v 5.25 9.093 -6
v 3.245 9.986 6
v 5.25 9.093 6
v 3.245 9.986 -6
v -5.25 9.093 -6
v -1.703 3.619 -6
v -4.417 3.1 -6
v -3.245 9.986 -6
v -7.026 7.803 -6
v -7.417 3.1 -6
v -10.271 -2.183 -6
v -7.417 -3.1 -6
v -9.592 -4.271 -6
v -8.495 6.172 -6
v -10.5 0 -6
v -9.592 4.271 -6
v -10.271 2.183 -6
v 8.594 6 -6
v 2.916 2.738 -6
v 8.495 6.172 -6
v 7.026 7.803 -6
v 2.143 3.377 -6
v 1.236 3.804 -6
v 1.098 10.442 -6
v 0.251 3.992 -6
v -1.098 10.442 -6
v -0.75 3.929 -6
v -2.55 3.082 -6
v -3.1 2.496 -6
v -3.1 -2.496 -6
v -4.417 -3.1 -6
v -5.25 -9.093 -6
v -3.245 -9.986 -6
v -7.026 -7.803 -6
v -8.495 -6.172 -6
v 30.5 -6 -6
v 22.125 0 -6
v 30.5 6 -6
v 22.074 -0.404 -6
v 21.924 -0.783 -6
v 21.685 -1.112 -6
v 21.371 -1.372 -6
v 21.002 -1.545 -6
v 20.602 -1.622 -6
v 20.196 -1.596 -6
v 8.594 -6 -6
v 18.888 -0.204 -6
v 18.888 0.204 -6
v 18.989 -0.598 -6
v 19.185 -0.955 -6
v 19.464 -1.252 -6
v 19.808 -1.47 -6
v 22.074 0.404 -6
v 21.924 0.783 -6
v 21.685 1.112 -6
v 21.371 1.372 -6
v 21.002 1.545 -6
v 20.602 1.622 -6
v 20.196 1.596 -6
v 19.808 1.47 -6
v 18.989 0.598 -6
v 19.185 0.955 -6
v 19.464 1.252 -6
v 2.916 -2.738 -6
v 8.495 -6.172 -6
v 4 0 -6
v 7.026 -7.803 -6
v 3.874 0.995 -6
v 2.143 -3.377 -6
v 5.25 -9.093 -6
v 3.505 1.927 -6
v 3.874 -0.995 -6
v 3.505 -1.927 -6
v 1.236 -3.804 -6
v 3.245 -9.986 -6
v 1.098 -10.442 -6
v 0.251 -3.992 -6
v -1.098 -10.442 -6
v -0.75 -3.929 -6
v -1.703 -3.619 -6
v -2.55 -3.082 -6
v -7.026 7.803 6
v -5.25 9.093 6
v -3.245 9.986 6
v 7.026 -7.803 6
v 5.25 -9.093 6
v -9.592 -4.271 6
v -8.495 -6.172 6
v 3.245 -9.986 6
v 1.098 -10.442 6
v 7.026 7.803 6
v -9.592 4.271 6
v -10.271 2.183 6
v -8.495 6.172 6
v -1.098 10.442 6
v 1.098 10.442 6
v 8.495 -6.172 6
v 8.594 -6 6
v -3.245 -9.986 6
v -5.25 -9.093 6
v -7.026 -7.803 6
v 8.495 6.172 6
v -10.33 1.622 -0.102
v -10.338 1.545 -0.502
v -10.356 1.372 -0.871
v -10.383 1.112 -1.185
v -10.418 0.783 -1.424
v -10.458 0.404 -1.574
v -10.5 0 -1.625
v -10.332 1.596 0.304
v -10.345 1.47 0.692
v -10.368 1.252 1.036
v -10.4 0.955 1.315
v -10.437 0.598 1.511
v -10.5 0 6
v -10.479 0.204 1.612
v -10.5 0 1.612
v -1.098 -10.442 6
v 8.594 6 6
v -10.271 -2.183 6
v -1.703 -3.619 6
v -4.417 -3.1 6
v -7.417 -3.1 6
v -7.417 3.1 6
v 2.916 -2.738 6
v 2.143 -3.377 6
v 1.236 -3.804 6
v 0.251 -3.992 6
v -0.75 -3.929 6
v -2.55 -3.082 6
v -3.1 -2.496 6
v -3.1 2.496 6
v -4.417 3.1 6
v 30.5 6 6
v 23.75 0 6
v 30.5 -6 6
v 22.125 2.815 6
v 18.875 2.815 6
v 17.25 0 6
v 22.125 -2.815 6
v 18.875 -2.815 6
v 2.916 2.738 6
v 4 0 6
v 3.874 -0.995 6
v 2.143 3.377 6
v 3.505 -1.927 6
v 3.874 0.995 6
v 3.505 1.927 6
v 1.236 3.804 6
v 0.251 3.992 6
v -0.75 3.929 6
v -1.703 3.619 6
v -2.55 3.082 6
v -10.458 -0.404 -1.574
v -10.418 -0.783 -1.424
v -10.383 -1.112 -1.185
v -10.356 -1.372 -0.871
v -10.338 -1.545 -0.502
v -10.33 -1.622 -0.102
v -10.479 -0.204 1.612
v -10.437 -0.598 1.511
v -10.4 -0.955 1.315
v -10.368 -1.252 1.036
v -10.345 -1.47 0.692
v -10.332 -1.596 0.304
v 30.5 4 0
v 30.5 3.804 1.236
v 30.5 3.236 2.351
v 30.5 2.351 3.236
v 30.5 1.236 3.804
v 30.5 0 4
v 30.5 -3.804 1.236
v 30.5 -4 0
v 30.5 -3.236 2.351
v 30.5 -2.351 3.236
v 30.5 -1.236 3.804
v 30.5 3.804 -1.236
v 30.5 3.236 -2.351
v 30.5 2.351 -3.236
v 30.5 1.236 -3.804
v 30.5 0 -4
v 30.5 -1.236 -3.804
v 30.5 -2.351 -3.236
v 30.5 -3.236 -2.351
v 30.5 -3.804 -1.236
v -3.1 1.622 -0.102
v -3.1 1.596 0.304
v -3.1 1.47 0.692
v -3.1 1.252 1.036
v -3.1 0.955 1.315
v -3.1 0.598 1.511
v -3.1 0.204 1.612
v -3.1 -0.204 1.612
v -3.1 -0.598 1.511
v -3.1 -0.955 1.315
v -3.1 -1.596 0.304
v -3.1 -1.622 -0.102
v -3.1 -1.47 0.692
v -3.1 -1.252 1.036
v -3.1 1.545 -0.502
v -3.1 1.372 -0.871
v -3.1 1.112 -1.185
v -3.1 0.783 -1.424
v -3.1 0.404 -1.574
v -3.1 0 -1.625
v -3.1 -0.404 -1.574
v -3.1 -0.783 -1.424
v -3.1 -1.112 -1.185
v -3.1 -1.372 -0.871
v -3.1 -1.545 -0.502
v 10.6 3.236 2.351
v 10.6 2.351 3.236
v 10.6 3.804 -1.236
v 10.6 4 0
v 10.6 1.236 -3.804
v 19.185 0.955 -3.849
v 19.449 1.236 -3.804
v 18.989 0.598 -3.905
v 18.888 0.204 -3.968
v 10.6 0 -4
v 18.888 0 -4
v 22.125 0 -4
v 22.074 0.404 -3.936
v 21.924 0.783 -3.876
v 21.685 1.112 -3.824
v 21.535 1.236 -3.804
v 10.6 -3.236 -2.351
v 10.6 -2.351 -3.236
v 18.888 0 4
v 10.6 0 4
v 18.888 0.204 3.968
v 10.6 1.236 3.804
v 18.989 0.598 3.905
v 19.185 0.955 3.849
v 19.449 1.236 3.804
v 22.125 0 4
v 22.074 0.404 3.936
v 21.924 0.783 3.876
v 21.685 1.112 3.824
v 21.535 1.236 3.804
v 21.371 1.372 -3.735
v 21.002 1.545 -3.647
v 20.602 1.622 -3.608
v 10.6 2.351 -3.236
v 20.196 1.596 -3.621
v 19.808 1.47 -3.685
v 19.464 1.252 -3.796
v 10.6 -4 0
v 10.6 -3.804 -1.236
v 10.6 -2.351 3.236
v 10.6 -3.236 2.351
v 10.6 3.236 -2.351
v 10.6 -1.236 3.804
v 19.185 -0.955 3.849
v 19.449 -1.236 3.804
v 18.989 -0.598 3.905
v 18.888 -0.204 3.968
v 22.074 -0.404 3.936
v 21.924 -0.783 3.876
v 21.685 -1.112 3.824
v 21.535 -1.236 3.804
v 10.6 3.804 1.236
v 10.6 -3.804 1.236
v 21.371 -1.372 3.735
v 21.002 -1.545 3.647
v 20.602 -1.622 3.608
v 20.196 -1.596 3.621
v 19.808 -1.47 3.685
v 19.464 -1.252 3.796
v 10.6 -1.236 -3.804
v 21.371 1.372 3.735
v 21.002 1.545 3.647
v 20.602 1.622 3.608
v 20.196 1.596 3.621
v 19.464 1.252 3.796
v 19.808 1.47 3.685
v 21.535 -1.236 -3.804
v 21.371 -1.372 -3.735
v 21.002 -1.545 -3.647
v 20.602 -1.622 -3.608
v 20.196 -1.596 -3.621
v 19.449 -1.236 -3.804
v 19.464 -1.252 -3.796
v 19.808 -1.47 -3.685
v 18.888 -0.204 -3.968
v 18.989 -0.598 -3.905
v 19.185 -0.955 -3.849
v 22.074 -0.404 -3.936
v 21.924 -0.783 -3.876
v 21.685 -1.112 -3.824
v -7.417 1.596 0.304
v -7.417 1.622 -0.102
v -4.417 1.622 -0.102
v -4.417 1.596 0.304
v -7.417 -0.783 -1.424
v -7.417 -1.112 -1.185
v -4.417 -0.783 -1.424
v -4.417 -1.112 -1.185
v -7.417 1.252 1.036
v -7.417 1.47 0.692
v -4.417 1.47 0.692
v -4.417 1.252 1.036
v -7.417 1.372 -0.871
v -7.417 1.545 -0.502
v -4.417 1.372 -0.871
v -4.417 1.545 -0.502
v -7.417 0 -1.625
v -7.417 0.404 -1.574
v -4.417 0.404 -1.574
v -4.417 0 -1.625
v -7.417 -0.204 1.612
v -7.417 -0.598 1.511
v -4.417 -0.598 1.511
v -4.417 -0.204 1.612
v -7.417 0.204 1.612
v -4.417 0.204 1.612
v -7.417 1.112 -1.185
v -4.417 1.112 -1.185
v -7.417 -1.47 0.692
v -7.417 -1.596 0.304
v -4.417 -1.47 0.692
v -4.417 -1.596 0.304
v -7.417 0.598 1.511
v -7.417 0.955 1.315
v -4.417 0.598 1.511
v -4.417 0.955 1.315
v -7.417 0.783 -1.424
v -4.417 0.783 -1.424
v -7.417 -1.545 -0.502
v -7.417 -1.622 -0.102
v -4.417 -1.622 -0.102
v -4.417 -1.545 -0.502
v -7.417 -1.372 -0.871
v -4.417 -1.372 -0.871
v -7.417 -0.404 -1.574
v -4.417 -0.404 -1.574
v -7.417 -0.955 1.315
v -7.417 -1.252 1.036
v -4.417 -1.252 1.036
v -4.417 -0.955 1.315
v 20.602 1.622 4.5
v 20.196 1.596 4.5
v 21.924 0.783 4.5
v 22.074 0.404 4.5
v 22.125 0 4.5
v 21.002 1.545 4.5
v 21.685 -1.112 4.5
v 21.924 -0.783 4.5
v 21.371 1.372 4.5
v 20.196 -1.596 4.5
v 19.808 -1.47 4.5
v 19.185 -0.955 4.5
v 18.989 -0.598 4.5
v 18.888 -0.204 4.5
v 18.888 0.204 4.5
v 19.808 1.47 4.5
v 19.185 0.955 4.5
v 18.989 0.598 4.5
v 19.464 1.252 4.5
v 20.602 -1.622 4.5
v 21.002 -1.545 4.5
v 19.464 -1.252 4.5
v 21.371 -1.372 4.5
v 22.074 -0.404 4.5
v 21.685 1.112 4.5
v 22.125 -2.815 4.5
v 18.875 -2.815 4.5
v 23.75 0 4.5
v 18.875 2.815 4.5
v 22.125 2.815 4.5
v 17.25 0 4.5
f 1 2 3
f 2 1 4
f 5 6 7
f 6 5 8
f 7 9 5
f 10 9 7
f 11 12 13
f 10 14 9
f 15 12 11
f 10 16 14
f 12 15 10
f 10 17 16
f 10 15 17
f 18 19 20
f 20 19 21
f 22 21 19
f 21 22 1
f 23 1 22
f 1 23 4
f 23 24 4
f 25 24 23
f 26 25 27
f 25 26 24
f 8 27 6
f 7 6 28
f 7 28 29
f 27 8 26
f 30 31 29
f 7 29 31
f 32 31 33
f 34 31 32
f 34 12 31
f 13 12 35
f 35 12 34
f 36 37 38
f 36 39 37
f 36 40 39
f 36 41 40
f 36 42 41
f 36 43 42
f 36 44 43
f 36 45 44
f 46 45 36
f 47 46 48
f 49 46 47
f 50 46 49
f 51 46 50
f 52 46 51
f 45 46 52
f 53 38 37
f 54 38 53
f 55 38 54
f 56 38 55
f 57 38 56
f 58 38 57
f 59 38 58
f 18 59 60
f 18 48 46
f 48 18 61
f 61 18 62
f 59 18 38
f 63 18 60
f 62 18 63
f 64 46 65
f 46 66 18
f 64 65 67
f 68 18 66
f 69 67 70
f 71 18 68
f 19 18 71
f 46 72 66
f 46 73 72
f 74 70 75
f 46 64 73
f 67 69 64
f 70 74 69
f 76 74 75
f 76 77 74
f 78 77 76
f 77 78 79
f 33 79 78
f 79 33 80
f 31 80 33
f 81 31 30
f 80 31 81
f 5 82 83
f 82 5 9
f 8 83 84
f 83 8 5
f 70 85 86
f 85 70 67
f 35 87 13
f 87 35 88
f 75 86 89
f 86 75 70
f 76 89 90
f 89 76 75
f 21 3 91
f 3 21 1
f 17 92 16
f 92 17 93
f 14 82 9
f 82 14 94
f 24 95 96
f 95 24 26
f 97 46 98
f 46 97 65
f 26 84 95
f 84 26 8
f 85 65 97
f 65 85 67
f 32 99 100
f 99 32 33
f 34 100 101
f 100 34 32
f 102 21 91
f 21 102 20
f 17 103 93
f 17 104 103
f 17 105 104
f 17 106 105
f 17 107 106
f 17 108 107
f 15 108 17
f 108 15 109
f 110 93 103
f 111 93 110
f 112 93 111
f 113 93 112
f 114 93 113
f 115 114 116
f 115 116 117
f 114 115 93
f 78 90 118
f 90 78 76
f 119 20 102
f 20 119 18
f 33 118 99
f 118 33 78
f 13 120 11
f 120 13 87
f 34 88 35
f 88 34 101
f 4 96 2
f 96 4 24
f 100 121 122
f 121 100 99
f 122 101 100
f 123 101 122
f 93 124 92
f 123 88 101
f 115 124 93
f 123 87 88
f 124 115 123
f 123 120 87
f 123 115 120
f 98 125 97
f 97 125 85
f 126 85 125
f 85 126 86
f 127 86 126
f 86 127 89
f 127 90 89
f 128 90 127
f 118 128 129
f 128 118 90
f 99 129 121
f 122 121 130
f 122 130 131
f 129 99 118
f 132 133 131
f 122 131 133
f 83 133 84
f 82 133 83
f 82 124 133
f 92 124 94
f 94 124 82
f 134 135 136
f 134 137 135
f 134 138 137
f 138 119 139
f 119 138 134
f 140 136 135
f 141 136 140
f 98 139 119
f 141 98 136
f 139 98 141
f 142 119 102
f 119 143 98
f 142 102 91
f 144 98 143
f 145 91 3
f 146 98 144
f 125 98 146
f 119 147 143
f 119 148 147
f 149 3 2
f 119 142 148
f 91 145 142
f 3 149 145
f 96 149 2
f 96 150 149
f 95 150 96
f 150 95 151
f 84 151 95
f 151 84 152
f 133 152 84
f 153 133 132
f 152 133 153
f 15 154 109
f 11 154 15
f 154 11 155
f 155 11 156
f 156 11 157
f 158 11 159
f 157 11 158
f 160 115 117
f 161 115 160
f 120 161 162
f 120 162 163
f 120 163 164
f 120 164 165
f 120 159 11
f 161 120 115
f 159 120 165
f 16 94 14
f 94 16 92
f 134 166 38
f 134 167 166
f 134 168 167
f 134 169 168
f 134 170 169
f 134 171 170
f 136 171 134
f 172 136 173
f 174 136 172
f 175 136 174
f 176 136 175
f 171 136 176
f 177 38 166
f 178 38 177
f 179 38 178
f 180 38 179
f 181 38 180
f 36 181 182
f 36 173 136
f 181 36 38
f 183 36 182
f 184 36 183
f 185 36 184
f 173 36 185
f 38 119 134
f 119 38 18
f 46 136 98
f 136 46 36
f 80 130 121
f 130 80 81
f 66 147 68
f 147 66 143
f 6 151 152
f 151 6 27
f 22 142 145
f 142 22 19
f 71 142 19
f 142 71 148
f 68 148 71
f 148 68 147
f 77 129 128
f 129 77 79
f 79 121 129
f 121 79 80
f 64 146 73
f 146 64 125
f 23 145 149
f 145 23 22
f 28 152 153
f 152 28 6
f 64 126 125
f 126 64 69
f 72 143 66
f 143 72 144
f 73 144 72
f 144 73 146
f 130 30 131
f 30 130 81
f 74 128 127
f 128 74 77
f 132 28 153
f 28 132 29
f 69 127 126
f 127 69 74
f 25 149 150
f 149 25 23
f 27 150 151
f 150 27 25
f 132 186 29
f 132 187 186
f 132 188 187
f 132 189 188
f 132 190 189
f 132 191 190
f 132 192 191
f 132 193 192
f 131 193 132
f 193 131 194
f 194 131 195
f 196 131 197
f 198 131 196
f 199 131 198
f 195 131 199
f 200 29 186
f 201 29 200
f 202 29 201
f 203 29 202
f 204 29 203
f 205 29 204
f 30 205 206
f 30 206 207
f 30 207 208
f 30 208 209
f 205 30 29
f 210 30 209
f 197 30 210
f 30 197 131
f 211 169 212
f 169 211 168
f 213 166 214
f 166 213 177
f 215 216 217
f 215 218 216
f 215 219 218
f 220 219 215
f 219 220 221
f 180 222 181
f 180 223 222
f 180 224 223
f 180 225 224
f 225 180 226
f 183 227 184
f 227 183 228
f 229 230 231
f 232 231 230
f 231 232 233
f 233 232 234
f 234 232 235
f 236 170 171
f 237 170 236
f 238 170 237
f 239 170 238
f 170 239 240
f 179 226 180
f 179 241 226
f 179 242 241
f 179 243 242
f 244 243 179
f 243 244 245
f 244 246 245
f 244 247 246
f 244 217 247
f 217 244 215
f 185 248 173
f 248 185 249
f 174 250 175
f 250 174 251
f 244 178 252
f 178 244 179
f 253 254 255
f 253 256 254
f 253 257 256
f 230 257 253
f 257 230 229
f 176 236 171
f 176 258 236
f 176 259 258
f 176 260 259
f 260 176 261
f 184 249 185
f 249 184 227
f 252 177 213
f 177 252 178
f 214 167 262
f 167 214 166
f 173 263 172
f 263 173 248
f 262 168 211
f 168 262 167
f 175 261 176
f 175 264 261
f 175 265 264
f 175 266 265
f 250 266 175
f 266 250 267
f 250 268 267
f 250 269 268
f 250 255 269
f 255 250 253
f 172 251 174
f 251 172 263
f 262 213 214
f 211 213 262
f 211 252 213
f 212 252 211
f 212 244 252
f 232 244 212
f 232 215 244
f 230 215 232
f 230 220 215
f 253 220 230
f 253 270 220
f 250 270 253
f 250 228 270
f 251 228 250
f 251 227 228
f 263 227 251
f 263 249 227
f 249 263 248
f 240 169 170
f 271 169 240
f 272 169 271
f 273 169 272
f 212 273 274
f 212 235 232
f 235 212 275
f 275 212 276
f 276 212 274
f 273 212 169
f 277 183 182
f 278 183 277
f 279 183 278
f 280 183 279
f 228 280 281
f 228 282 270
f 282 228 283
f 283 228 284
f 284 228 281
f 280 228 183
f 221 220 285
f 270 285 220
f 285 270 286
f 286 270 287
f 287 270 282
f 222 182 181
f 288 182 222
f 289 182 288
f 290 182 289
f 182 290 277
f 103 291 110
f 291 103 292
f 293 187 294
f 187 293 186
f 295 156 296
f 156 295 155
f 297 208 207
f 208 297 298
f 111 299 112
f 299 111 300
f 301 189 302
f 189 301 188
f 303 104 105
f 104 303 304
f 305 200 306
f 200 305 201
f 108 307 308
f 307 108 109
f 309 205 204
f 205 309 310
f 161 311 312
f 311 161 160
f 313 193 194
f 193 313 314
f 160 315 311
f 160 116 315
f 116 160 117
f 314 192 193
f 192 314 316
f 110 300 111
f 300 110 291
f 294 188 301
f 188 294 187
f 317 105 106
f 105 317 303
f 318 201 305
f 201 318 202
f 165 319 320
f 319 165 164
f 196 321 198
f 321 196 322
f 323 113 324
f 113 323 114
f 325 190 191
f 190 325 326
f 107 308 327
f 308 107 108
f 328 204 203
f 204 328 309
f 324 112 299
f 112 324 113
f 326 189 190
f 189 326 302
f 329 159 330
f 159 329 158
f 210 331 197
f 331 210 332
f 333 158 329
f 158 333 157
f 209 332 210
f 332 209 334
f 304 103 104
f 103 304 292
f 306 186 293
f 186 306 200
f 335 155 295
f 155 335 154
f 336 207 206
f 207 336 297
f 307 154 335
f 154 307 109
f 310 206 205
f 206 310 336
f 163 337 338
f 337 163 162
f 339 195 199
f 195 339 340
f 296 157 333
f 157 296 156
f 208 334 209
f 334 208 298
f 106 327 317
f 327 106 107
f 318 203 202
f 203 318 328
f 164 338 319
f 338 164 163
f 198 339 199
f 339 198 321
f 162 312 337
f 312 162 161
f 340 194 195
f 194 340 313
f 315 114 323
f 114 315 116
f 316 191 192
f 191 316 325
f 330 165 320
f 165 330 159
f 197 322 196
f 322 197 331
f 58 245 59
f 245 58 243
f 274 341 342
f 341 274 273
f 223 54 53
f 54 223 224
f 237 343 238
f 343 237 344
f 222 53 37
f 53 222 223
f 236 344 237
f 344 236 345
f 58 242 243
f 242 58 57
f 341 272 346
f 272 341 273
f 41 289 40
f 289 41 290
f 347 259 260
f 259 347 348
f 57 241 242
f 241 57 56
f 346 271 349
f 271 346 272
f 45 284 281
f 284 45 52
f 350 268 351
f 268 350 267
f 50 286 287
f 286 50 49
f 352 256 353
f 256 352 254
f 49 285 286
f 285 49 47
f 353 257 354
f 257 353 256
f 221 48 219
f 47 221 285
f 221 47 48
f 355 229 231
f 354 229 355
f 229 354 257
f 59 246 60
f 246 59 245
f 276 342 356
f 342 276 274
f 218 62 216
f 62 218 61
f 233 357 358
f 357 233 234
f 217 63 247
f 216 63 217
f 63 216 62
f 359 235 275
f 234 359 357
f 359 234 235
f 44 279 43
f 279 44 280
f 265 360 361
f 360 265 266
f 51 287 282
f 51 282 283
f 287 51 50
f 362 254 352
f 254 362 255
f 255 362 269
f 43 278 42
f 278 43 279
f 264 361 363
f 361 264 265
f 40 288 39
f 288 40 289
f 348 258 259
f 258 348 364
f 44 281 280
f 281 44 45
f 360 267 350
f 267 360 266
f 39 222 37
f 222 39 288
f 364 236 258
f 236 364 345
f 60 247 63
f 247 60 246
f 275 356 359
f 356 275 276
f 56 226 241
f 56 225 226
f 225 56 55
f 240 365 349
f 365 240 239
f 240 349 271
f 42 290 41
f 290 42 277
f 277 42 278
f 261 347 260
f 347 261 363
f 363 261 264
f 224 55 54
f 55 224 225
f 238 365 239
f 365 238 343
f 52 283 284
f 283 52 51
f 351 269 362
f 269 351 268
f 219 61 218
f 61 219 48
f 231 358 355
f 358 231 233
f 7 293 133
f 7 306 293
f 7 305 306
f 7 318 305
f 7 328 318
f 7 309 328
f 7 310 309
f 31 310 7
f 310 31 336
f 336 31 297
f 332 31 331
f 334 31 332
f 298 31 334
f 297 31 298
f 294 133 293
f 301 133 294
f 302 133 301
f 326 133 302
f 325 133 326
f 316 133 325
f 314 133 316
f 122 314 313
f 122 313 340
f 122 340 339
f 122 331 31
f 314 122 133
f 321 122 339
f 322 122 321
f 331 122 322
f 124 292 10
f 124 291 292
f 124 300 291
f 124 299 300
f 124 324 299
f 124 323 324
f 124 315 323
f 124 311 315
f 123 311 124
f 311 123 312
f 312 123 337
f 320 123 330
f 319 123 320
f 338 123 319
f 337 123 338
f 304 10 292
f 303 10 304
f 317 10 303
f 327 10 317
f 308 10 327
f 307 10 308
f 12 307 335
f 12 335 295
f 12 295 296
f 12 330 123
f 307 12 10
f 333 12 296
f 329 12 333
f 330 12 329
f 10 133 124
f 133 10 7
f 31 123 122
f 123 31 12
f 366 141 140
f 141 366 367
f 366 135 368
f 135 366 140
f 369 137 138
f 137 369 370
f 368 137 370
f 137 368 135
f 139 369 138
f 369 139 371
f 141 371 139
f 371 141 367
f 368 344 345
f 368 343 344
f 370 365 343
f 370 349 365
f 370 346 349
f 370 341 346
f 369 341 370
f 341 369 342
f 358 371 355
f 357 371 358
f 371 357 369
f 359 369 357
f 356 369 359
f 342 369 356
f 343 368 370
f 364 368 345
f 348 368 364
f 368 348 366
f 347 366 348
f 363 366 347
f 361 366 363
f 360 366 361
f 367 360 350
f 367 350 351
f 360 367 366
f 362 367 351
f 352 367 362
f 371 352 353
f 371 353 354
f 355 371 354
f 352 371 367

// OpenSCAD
// file: variables.scad
// Pinya3 3D Food Printer
// file: variables.scad 
// author: Luis Rodriguez
// version: 0.1
// w3b: 3digitalcooks.com 

// Variables for all the project
// just numbers??
alpha = 0.7;

// FRAME 
frame_alpha = alpha;
frame_profile_width = 20;

frame_height = 370;
frame_width = 250;  // 250mm -> 7capsules~de 8cm
frame_lenght = 200;

// PRINTING AREA
// from: https://www.marginallyclever.com/other/samples/fk-ik-test.html
// Base radius (f) = 80mm
// End Effector radius (e) = 30mm
// Bice length (rf) = 200mm
// Forearm length = 260mm
// PA = 260 x 260 x 260
// X=-128.225 to 128.225 mm 
// Y=-128.225 to 128.225 mm
// Z=-387.23 to -130.781 mm
printing_area_alpha = 0.2;
printing_area_x = 128*2;//195*2;
printing_area_y = 128*2;//195*2;
printing_area_distance_from_motors_base = 130;//151
printing_area_z_max = 387;
printing_area_z = printing_area_z_max - printing_area_distance_from_motors_base;//540-151;
echo("printing z =",printing_area_z);
printing_area_x_displacement = frame_width/2 + printing_area_x/2;

// FOREARM 
forearm_alpha = alpha;
forearm_length = 200;
forearm_rad = 4;
forearm_motors_joint_rad = 25;

// MOTORS BASE
motors_base_alpha = alpha;
motors_base_thickness = 6;
motors_base_rad = forearm_motors_joint_rad;

// DELTA BEAM
delta_beam_alpha = alpha;
delta_beam_length = printing_area_x_displacement 
                    + forearm_motors_joint_rad 
                    + frame_width/2;
echo("Delta beam lenght = ", delta_beam_length);
delta_beam_profile_width = frame_profile_width*3; //60cm
delta_beam_under_frame = 0; // 1 = Beam under frame or 0 = Beam on frame
delta_beam_bolt_rad = 4;
delta_beam_distance_btw_slots = 20;


// CAROUSEL
carousel_alpha = 0.3;
carousel_number_of_tools = 11;
carousel_offset_rotation = 0; // in degrees
carousel_rad = frame_width-20;//160;
carousel_tool_height = 180;
carousel_tool_rad = 40;

// GEARED STEPPER
stepper_shaft_diameter = 8;

// MOTOR BICEP JOINT
motor_bicep_joint_shaft_holder_diameter = 21;
motor_bicep_joint_shaft_holder_thickness = 12;

motor_bicep_joint_bicep_holder_width = motor_bicep_joint_shaft_holder_thickness;
motor_bicep_joint_bicep_holder_length = 20 + motor_bicep_joint_shaft_holder_diameter/2;

motor_bicep_joint_bicep_insert_lenght = 20;

motor_bicep_joint_shaft_bolt_lenght = 12;
motor_bicep_joint_shaft_bolt_diameter = 3.25;

motor_bicep_joint_bicep_bolt_diameter = motor_bicep_joint_shaft_bolt_diameter;
motor_bicep_joint_bicep_bolt_lenght = 30;

motor_bicep_joint_shaft_nut_thickness = 3;
motor_bicep_joint_shaft_nut_width = 6.2;
motor_bicep_joint_shaft_nut_hole_height = 30;
motor_bicep_joint_shaft_nut_displacement = stepper_shaft_diameter/3 + 
            (motor_bicep_joint_shaft_holder_diameter/2 - stepper_shaft_diameter/2)/2;
motor_bicep_joint_bicep_nut_diameter = 6.5;
motor_bicep_joint_bicep_nut_thickness = motor_bicep_joint_shaft_nut_thickness;

motor_bicep_joint_shaft_flat_displecement = -4.6;
// BICEP
bicep_diameter = 8;
// main file
// Pinya3 3D Food Printer
// file: motor_bicep_joint.scad 
// author: Luis Rodriguez
// version: 0.1
// w3b: 3digitalcooks.com

include <variables.scad>

motor_bicep_joint();

module motor_bicep_joint(){
  difference(){
    union(){ // Add
        motor_bicep_joint_shaft_holder();
        motor_bicep_joint_bicep_holder();
      }
    union(){ // Substract
      motor_bicep_joint_shaft_hole();
      motor_bicep_joint_bicep_hole();
      motor_bicep_joint_shaft_bolt_hole();
      motor_bicep_joint_bicep_bolt_hole();
      motor_bicep_joint_shaft_nut_hole();
      motor_bicep_joint_bicep_nut_hole();
      }
  }
}


// ADD

module motor_bicep_joint_shaft_holder() {
  cylinder(h = motor_bicep_joint_shaft_holder_thickness, 
           r = motor_bicep_joint_shaft_holder_diameter/2, center=true);
}

module motor_bicep_joint_bicep_holder() {
  translate([motor_bicep_joint_bicep_holder_length/2, 0, 0])
    cube([motor_bicep_joint_bicep_holder_length, 
          motor_bicep_joint_bicep_holder_width, 
          motor_bicep_joint_bicep_holder_width], center=true); 
}

// SUBSTRACT

module motor_bicep_joint_shaft_hole() {
  difference() {
    cylinder(h = motor_bicep_joint_shaft_holder_thickness * 3,
             r = stepper_shaft_diameter/2, center=true, $fn = 25);
    translate([motor_bicep_joint_shaft_flat_displecement, 0, 0])
      cube([motor_bicep_joint_shaft_nut_thickness, 
            motor_bicep_joint_shaft_nut_width, 
            motor_bicep_joint_shaft_holder_thickness], center=true);  
  }
}

module motor_bicep_joint_bicep_hole() {
  translate([motor_bicep_joint_bicep_holder_length 
              - motor_bicep_joint_bicep_insert_lenght/2 + 0.1, 0, 0])
    rotate([0, 90, 0])
      cylinder(r = bicep_diameter/2, 
               h = motor_bicep_joint_bicep_insert_lenght, 
               center=true, $fn = 20);
}

module motor_bicep_joint_shaft_bolt_hole() {
  translate([-motor_bicep_joint_shaft_bolt_lenght/2, 0, 0])
    rotate([0, 90, 0])
      cylinder(h=motor_bicep_joint_shaft_bolt_lenght, 
               r=motor_bicep_joint_shaft_bolt_diameter/2, center=true, $fn=25);
}

module motor_bicep_joint_bicep_bolt_hole() {
  translate([motor_bicep_joint_bicep_holder_length 
             - motor_bicep_joint_bicep_insert_lenght/2, 0, 0])
    cylinder(h = motor_bicep_joint_bicep_bolt_lenght, 
             r = motor_bicep_joint_bicep_bolt_diameter/2, center=true, $fn=25);
}

module motor_bicep_joint_shaft_nut_hole() {
  translate([-motor_bicep_joint_shaft_nut_displacement, 0, 0])
    cube([motor_bicep_joint_shaft_nut_thickness, 
          motor_bicep_joint_shaft_nut_width, 
          motor_bicep_joint_shaft_nut_hole_height], center=true);
}

module motor_bicep_joint_bicep_nut_hole() {
  translate([motor_bicep_joint_bicep_holder_length 
             - motor_bicep_joint_bicep_insert_lenght/2, 0,
             motor_bicep_joint_shaft_holder_thickness/2])
    cylinder(h = motor_bicep_joint_bicep_nut_thickness, 
             r = motor_bicep_joint_bicep_nut_diameter/2, center=true, $fn=6); 
}
